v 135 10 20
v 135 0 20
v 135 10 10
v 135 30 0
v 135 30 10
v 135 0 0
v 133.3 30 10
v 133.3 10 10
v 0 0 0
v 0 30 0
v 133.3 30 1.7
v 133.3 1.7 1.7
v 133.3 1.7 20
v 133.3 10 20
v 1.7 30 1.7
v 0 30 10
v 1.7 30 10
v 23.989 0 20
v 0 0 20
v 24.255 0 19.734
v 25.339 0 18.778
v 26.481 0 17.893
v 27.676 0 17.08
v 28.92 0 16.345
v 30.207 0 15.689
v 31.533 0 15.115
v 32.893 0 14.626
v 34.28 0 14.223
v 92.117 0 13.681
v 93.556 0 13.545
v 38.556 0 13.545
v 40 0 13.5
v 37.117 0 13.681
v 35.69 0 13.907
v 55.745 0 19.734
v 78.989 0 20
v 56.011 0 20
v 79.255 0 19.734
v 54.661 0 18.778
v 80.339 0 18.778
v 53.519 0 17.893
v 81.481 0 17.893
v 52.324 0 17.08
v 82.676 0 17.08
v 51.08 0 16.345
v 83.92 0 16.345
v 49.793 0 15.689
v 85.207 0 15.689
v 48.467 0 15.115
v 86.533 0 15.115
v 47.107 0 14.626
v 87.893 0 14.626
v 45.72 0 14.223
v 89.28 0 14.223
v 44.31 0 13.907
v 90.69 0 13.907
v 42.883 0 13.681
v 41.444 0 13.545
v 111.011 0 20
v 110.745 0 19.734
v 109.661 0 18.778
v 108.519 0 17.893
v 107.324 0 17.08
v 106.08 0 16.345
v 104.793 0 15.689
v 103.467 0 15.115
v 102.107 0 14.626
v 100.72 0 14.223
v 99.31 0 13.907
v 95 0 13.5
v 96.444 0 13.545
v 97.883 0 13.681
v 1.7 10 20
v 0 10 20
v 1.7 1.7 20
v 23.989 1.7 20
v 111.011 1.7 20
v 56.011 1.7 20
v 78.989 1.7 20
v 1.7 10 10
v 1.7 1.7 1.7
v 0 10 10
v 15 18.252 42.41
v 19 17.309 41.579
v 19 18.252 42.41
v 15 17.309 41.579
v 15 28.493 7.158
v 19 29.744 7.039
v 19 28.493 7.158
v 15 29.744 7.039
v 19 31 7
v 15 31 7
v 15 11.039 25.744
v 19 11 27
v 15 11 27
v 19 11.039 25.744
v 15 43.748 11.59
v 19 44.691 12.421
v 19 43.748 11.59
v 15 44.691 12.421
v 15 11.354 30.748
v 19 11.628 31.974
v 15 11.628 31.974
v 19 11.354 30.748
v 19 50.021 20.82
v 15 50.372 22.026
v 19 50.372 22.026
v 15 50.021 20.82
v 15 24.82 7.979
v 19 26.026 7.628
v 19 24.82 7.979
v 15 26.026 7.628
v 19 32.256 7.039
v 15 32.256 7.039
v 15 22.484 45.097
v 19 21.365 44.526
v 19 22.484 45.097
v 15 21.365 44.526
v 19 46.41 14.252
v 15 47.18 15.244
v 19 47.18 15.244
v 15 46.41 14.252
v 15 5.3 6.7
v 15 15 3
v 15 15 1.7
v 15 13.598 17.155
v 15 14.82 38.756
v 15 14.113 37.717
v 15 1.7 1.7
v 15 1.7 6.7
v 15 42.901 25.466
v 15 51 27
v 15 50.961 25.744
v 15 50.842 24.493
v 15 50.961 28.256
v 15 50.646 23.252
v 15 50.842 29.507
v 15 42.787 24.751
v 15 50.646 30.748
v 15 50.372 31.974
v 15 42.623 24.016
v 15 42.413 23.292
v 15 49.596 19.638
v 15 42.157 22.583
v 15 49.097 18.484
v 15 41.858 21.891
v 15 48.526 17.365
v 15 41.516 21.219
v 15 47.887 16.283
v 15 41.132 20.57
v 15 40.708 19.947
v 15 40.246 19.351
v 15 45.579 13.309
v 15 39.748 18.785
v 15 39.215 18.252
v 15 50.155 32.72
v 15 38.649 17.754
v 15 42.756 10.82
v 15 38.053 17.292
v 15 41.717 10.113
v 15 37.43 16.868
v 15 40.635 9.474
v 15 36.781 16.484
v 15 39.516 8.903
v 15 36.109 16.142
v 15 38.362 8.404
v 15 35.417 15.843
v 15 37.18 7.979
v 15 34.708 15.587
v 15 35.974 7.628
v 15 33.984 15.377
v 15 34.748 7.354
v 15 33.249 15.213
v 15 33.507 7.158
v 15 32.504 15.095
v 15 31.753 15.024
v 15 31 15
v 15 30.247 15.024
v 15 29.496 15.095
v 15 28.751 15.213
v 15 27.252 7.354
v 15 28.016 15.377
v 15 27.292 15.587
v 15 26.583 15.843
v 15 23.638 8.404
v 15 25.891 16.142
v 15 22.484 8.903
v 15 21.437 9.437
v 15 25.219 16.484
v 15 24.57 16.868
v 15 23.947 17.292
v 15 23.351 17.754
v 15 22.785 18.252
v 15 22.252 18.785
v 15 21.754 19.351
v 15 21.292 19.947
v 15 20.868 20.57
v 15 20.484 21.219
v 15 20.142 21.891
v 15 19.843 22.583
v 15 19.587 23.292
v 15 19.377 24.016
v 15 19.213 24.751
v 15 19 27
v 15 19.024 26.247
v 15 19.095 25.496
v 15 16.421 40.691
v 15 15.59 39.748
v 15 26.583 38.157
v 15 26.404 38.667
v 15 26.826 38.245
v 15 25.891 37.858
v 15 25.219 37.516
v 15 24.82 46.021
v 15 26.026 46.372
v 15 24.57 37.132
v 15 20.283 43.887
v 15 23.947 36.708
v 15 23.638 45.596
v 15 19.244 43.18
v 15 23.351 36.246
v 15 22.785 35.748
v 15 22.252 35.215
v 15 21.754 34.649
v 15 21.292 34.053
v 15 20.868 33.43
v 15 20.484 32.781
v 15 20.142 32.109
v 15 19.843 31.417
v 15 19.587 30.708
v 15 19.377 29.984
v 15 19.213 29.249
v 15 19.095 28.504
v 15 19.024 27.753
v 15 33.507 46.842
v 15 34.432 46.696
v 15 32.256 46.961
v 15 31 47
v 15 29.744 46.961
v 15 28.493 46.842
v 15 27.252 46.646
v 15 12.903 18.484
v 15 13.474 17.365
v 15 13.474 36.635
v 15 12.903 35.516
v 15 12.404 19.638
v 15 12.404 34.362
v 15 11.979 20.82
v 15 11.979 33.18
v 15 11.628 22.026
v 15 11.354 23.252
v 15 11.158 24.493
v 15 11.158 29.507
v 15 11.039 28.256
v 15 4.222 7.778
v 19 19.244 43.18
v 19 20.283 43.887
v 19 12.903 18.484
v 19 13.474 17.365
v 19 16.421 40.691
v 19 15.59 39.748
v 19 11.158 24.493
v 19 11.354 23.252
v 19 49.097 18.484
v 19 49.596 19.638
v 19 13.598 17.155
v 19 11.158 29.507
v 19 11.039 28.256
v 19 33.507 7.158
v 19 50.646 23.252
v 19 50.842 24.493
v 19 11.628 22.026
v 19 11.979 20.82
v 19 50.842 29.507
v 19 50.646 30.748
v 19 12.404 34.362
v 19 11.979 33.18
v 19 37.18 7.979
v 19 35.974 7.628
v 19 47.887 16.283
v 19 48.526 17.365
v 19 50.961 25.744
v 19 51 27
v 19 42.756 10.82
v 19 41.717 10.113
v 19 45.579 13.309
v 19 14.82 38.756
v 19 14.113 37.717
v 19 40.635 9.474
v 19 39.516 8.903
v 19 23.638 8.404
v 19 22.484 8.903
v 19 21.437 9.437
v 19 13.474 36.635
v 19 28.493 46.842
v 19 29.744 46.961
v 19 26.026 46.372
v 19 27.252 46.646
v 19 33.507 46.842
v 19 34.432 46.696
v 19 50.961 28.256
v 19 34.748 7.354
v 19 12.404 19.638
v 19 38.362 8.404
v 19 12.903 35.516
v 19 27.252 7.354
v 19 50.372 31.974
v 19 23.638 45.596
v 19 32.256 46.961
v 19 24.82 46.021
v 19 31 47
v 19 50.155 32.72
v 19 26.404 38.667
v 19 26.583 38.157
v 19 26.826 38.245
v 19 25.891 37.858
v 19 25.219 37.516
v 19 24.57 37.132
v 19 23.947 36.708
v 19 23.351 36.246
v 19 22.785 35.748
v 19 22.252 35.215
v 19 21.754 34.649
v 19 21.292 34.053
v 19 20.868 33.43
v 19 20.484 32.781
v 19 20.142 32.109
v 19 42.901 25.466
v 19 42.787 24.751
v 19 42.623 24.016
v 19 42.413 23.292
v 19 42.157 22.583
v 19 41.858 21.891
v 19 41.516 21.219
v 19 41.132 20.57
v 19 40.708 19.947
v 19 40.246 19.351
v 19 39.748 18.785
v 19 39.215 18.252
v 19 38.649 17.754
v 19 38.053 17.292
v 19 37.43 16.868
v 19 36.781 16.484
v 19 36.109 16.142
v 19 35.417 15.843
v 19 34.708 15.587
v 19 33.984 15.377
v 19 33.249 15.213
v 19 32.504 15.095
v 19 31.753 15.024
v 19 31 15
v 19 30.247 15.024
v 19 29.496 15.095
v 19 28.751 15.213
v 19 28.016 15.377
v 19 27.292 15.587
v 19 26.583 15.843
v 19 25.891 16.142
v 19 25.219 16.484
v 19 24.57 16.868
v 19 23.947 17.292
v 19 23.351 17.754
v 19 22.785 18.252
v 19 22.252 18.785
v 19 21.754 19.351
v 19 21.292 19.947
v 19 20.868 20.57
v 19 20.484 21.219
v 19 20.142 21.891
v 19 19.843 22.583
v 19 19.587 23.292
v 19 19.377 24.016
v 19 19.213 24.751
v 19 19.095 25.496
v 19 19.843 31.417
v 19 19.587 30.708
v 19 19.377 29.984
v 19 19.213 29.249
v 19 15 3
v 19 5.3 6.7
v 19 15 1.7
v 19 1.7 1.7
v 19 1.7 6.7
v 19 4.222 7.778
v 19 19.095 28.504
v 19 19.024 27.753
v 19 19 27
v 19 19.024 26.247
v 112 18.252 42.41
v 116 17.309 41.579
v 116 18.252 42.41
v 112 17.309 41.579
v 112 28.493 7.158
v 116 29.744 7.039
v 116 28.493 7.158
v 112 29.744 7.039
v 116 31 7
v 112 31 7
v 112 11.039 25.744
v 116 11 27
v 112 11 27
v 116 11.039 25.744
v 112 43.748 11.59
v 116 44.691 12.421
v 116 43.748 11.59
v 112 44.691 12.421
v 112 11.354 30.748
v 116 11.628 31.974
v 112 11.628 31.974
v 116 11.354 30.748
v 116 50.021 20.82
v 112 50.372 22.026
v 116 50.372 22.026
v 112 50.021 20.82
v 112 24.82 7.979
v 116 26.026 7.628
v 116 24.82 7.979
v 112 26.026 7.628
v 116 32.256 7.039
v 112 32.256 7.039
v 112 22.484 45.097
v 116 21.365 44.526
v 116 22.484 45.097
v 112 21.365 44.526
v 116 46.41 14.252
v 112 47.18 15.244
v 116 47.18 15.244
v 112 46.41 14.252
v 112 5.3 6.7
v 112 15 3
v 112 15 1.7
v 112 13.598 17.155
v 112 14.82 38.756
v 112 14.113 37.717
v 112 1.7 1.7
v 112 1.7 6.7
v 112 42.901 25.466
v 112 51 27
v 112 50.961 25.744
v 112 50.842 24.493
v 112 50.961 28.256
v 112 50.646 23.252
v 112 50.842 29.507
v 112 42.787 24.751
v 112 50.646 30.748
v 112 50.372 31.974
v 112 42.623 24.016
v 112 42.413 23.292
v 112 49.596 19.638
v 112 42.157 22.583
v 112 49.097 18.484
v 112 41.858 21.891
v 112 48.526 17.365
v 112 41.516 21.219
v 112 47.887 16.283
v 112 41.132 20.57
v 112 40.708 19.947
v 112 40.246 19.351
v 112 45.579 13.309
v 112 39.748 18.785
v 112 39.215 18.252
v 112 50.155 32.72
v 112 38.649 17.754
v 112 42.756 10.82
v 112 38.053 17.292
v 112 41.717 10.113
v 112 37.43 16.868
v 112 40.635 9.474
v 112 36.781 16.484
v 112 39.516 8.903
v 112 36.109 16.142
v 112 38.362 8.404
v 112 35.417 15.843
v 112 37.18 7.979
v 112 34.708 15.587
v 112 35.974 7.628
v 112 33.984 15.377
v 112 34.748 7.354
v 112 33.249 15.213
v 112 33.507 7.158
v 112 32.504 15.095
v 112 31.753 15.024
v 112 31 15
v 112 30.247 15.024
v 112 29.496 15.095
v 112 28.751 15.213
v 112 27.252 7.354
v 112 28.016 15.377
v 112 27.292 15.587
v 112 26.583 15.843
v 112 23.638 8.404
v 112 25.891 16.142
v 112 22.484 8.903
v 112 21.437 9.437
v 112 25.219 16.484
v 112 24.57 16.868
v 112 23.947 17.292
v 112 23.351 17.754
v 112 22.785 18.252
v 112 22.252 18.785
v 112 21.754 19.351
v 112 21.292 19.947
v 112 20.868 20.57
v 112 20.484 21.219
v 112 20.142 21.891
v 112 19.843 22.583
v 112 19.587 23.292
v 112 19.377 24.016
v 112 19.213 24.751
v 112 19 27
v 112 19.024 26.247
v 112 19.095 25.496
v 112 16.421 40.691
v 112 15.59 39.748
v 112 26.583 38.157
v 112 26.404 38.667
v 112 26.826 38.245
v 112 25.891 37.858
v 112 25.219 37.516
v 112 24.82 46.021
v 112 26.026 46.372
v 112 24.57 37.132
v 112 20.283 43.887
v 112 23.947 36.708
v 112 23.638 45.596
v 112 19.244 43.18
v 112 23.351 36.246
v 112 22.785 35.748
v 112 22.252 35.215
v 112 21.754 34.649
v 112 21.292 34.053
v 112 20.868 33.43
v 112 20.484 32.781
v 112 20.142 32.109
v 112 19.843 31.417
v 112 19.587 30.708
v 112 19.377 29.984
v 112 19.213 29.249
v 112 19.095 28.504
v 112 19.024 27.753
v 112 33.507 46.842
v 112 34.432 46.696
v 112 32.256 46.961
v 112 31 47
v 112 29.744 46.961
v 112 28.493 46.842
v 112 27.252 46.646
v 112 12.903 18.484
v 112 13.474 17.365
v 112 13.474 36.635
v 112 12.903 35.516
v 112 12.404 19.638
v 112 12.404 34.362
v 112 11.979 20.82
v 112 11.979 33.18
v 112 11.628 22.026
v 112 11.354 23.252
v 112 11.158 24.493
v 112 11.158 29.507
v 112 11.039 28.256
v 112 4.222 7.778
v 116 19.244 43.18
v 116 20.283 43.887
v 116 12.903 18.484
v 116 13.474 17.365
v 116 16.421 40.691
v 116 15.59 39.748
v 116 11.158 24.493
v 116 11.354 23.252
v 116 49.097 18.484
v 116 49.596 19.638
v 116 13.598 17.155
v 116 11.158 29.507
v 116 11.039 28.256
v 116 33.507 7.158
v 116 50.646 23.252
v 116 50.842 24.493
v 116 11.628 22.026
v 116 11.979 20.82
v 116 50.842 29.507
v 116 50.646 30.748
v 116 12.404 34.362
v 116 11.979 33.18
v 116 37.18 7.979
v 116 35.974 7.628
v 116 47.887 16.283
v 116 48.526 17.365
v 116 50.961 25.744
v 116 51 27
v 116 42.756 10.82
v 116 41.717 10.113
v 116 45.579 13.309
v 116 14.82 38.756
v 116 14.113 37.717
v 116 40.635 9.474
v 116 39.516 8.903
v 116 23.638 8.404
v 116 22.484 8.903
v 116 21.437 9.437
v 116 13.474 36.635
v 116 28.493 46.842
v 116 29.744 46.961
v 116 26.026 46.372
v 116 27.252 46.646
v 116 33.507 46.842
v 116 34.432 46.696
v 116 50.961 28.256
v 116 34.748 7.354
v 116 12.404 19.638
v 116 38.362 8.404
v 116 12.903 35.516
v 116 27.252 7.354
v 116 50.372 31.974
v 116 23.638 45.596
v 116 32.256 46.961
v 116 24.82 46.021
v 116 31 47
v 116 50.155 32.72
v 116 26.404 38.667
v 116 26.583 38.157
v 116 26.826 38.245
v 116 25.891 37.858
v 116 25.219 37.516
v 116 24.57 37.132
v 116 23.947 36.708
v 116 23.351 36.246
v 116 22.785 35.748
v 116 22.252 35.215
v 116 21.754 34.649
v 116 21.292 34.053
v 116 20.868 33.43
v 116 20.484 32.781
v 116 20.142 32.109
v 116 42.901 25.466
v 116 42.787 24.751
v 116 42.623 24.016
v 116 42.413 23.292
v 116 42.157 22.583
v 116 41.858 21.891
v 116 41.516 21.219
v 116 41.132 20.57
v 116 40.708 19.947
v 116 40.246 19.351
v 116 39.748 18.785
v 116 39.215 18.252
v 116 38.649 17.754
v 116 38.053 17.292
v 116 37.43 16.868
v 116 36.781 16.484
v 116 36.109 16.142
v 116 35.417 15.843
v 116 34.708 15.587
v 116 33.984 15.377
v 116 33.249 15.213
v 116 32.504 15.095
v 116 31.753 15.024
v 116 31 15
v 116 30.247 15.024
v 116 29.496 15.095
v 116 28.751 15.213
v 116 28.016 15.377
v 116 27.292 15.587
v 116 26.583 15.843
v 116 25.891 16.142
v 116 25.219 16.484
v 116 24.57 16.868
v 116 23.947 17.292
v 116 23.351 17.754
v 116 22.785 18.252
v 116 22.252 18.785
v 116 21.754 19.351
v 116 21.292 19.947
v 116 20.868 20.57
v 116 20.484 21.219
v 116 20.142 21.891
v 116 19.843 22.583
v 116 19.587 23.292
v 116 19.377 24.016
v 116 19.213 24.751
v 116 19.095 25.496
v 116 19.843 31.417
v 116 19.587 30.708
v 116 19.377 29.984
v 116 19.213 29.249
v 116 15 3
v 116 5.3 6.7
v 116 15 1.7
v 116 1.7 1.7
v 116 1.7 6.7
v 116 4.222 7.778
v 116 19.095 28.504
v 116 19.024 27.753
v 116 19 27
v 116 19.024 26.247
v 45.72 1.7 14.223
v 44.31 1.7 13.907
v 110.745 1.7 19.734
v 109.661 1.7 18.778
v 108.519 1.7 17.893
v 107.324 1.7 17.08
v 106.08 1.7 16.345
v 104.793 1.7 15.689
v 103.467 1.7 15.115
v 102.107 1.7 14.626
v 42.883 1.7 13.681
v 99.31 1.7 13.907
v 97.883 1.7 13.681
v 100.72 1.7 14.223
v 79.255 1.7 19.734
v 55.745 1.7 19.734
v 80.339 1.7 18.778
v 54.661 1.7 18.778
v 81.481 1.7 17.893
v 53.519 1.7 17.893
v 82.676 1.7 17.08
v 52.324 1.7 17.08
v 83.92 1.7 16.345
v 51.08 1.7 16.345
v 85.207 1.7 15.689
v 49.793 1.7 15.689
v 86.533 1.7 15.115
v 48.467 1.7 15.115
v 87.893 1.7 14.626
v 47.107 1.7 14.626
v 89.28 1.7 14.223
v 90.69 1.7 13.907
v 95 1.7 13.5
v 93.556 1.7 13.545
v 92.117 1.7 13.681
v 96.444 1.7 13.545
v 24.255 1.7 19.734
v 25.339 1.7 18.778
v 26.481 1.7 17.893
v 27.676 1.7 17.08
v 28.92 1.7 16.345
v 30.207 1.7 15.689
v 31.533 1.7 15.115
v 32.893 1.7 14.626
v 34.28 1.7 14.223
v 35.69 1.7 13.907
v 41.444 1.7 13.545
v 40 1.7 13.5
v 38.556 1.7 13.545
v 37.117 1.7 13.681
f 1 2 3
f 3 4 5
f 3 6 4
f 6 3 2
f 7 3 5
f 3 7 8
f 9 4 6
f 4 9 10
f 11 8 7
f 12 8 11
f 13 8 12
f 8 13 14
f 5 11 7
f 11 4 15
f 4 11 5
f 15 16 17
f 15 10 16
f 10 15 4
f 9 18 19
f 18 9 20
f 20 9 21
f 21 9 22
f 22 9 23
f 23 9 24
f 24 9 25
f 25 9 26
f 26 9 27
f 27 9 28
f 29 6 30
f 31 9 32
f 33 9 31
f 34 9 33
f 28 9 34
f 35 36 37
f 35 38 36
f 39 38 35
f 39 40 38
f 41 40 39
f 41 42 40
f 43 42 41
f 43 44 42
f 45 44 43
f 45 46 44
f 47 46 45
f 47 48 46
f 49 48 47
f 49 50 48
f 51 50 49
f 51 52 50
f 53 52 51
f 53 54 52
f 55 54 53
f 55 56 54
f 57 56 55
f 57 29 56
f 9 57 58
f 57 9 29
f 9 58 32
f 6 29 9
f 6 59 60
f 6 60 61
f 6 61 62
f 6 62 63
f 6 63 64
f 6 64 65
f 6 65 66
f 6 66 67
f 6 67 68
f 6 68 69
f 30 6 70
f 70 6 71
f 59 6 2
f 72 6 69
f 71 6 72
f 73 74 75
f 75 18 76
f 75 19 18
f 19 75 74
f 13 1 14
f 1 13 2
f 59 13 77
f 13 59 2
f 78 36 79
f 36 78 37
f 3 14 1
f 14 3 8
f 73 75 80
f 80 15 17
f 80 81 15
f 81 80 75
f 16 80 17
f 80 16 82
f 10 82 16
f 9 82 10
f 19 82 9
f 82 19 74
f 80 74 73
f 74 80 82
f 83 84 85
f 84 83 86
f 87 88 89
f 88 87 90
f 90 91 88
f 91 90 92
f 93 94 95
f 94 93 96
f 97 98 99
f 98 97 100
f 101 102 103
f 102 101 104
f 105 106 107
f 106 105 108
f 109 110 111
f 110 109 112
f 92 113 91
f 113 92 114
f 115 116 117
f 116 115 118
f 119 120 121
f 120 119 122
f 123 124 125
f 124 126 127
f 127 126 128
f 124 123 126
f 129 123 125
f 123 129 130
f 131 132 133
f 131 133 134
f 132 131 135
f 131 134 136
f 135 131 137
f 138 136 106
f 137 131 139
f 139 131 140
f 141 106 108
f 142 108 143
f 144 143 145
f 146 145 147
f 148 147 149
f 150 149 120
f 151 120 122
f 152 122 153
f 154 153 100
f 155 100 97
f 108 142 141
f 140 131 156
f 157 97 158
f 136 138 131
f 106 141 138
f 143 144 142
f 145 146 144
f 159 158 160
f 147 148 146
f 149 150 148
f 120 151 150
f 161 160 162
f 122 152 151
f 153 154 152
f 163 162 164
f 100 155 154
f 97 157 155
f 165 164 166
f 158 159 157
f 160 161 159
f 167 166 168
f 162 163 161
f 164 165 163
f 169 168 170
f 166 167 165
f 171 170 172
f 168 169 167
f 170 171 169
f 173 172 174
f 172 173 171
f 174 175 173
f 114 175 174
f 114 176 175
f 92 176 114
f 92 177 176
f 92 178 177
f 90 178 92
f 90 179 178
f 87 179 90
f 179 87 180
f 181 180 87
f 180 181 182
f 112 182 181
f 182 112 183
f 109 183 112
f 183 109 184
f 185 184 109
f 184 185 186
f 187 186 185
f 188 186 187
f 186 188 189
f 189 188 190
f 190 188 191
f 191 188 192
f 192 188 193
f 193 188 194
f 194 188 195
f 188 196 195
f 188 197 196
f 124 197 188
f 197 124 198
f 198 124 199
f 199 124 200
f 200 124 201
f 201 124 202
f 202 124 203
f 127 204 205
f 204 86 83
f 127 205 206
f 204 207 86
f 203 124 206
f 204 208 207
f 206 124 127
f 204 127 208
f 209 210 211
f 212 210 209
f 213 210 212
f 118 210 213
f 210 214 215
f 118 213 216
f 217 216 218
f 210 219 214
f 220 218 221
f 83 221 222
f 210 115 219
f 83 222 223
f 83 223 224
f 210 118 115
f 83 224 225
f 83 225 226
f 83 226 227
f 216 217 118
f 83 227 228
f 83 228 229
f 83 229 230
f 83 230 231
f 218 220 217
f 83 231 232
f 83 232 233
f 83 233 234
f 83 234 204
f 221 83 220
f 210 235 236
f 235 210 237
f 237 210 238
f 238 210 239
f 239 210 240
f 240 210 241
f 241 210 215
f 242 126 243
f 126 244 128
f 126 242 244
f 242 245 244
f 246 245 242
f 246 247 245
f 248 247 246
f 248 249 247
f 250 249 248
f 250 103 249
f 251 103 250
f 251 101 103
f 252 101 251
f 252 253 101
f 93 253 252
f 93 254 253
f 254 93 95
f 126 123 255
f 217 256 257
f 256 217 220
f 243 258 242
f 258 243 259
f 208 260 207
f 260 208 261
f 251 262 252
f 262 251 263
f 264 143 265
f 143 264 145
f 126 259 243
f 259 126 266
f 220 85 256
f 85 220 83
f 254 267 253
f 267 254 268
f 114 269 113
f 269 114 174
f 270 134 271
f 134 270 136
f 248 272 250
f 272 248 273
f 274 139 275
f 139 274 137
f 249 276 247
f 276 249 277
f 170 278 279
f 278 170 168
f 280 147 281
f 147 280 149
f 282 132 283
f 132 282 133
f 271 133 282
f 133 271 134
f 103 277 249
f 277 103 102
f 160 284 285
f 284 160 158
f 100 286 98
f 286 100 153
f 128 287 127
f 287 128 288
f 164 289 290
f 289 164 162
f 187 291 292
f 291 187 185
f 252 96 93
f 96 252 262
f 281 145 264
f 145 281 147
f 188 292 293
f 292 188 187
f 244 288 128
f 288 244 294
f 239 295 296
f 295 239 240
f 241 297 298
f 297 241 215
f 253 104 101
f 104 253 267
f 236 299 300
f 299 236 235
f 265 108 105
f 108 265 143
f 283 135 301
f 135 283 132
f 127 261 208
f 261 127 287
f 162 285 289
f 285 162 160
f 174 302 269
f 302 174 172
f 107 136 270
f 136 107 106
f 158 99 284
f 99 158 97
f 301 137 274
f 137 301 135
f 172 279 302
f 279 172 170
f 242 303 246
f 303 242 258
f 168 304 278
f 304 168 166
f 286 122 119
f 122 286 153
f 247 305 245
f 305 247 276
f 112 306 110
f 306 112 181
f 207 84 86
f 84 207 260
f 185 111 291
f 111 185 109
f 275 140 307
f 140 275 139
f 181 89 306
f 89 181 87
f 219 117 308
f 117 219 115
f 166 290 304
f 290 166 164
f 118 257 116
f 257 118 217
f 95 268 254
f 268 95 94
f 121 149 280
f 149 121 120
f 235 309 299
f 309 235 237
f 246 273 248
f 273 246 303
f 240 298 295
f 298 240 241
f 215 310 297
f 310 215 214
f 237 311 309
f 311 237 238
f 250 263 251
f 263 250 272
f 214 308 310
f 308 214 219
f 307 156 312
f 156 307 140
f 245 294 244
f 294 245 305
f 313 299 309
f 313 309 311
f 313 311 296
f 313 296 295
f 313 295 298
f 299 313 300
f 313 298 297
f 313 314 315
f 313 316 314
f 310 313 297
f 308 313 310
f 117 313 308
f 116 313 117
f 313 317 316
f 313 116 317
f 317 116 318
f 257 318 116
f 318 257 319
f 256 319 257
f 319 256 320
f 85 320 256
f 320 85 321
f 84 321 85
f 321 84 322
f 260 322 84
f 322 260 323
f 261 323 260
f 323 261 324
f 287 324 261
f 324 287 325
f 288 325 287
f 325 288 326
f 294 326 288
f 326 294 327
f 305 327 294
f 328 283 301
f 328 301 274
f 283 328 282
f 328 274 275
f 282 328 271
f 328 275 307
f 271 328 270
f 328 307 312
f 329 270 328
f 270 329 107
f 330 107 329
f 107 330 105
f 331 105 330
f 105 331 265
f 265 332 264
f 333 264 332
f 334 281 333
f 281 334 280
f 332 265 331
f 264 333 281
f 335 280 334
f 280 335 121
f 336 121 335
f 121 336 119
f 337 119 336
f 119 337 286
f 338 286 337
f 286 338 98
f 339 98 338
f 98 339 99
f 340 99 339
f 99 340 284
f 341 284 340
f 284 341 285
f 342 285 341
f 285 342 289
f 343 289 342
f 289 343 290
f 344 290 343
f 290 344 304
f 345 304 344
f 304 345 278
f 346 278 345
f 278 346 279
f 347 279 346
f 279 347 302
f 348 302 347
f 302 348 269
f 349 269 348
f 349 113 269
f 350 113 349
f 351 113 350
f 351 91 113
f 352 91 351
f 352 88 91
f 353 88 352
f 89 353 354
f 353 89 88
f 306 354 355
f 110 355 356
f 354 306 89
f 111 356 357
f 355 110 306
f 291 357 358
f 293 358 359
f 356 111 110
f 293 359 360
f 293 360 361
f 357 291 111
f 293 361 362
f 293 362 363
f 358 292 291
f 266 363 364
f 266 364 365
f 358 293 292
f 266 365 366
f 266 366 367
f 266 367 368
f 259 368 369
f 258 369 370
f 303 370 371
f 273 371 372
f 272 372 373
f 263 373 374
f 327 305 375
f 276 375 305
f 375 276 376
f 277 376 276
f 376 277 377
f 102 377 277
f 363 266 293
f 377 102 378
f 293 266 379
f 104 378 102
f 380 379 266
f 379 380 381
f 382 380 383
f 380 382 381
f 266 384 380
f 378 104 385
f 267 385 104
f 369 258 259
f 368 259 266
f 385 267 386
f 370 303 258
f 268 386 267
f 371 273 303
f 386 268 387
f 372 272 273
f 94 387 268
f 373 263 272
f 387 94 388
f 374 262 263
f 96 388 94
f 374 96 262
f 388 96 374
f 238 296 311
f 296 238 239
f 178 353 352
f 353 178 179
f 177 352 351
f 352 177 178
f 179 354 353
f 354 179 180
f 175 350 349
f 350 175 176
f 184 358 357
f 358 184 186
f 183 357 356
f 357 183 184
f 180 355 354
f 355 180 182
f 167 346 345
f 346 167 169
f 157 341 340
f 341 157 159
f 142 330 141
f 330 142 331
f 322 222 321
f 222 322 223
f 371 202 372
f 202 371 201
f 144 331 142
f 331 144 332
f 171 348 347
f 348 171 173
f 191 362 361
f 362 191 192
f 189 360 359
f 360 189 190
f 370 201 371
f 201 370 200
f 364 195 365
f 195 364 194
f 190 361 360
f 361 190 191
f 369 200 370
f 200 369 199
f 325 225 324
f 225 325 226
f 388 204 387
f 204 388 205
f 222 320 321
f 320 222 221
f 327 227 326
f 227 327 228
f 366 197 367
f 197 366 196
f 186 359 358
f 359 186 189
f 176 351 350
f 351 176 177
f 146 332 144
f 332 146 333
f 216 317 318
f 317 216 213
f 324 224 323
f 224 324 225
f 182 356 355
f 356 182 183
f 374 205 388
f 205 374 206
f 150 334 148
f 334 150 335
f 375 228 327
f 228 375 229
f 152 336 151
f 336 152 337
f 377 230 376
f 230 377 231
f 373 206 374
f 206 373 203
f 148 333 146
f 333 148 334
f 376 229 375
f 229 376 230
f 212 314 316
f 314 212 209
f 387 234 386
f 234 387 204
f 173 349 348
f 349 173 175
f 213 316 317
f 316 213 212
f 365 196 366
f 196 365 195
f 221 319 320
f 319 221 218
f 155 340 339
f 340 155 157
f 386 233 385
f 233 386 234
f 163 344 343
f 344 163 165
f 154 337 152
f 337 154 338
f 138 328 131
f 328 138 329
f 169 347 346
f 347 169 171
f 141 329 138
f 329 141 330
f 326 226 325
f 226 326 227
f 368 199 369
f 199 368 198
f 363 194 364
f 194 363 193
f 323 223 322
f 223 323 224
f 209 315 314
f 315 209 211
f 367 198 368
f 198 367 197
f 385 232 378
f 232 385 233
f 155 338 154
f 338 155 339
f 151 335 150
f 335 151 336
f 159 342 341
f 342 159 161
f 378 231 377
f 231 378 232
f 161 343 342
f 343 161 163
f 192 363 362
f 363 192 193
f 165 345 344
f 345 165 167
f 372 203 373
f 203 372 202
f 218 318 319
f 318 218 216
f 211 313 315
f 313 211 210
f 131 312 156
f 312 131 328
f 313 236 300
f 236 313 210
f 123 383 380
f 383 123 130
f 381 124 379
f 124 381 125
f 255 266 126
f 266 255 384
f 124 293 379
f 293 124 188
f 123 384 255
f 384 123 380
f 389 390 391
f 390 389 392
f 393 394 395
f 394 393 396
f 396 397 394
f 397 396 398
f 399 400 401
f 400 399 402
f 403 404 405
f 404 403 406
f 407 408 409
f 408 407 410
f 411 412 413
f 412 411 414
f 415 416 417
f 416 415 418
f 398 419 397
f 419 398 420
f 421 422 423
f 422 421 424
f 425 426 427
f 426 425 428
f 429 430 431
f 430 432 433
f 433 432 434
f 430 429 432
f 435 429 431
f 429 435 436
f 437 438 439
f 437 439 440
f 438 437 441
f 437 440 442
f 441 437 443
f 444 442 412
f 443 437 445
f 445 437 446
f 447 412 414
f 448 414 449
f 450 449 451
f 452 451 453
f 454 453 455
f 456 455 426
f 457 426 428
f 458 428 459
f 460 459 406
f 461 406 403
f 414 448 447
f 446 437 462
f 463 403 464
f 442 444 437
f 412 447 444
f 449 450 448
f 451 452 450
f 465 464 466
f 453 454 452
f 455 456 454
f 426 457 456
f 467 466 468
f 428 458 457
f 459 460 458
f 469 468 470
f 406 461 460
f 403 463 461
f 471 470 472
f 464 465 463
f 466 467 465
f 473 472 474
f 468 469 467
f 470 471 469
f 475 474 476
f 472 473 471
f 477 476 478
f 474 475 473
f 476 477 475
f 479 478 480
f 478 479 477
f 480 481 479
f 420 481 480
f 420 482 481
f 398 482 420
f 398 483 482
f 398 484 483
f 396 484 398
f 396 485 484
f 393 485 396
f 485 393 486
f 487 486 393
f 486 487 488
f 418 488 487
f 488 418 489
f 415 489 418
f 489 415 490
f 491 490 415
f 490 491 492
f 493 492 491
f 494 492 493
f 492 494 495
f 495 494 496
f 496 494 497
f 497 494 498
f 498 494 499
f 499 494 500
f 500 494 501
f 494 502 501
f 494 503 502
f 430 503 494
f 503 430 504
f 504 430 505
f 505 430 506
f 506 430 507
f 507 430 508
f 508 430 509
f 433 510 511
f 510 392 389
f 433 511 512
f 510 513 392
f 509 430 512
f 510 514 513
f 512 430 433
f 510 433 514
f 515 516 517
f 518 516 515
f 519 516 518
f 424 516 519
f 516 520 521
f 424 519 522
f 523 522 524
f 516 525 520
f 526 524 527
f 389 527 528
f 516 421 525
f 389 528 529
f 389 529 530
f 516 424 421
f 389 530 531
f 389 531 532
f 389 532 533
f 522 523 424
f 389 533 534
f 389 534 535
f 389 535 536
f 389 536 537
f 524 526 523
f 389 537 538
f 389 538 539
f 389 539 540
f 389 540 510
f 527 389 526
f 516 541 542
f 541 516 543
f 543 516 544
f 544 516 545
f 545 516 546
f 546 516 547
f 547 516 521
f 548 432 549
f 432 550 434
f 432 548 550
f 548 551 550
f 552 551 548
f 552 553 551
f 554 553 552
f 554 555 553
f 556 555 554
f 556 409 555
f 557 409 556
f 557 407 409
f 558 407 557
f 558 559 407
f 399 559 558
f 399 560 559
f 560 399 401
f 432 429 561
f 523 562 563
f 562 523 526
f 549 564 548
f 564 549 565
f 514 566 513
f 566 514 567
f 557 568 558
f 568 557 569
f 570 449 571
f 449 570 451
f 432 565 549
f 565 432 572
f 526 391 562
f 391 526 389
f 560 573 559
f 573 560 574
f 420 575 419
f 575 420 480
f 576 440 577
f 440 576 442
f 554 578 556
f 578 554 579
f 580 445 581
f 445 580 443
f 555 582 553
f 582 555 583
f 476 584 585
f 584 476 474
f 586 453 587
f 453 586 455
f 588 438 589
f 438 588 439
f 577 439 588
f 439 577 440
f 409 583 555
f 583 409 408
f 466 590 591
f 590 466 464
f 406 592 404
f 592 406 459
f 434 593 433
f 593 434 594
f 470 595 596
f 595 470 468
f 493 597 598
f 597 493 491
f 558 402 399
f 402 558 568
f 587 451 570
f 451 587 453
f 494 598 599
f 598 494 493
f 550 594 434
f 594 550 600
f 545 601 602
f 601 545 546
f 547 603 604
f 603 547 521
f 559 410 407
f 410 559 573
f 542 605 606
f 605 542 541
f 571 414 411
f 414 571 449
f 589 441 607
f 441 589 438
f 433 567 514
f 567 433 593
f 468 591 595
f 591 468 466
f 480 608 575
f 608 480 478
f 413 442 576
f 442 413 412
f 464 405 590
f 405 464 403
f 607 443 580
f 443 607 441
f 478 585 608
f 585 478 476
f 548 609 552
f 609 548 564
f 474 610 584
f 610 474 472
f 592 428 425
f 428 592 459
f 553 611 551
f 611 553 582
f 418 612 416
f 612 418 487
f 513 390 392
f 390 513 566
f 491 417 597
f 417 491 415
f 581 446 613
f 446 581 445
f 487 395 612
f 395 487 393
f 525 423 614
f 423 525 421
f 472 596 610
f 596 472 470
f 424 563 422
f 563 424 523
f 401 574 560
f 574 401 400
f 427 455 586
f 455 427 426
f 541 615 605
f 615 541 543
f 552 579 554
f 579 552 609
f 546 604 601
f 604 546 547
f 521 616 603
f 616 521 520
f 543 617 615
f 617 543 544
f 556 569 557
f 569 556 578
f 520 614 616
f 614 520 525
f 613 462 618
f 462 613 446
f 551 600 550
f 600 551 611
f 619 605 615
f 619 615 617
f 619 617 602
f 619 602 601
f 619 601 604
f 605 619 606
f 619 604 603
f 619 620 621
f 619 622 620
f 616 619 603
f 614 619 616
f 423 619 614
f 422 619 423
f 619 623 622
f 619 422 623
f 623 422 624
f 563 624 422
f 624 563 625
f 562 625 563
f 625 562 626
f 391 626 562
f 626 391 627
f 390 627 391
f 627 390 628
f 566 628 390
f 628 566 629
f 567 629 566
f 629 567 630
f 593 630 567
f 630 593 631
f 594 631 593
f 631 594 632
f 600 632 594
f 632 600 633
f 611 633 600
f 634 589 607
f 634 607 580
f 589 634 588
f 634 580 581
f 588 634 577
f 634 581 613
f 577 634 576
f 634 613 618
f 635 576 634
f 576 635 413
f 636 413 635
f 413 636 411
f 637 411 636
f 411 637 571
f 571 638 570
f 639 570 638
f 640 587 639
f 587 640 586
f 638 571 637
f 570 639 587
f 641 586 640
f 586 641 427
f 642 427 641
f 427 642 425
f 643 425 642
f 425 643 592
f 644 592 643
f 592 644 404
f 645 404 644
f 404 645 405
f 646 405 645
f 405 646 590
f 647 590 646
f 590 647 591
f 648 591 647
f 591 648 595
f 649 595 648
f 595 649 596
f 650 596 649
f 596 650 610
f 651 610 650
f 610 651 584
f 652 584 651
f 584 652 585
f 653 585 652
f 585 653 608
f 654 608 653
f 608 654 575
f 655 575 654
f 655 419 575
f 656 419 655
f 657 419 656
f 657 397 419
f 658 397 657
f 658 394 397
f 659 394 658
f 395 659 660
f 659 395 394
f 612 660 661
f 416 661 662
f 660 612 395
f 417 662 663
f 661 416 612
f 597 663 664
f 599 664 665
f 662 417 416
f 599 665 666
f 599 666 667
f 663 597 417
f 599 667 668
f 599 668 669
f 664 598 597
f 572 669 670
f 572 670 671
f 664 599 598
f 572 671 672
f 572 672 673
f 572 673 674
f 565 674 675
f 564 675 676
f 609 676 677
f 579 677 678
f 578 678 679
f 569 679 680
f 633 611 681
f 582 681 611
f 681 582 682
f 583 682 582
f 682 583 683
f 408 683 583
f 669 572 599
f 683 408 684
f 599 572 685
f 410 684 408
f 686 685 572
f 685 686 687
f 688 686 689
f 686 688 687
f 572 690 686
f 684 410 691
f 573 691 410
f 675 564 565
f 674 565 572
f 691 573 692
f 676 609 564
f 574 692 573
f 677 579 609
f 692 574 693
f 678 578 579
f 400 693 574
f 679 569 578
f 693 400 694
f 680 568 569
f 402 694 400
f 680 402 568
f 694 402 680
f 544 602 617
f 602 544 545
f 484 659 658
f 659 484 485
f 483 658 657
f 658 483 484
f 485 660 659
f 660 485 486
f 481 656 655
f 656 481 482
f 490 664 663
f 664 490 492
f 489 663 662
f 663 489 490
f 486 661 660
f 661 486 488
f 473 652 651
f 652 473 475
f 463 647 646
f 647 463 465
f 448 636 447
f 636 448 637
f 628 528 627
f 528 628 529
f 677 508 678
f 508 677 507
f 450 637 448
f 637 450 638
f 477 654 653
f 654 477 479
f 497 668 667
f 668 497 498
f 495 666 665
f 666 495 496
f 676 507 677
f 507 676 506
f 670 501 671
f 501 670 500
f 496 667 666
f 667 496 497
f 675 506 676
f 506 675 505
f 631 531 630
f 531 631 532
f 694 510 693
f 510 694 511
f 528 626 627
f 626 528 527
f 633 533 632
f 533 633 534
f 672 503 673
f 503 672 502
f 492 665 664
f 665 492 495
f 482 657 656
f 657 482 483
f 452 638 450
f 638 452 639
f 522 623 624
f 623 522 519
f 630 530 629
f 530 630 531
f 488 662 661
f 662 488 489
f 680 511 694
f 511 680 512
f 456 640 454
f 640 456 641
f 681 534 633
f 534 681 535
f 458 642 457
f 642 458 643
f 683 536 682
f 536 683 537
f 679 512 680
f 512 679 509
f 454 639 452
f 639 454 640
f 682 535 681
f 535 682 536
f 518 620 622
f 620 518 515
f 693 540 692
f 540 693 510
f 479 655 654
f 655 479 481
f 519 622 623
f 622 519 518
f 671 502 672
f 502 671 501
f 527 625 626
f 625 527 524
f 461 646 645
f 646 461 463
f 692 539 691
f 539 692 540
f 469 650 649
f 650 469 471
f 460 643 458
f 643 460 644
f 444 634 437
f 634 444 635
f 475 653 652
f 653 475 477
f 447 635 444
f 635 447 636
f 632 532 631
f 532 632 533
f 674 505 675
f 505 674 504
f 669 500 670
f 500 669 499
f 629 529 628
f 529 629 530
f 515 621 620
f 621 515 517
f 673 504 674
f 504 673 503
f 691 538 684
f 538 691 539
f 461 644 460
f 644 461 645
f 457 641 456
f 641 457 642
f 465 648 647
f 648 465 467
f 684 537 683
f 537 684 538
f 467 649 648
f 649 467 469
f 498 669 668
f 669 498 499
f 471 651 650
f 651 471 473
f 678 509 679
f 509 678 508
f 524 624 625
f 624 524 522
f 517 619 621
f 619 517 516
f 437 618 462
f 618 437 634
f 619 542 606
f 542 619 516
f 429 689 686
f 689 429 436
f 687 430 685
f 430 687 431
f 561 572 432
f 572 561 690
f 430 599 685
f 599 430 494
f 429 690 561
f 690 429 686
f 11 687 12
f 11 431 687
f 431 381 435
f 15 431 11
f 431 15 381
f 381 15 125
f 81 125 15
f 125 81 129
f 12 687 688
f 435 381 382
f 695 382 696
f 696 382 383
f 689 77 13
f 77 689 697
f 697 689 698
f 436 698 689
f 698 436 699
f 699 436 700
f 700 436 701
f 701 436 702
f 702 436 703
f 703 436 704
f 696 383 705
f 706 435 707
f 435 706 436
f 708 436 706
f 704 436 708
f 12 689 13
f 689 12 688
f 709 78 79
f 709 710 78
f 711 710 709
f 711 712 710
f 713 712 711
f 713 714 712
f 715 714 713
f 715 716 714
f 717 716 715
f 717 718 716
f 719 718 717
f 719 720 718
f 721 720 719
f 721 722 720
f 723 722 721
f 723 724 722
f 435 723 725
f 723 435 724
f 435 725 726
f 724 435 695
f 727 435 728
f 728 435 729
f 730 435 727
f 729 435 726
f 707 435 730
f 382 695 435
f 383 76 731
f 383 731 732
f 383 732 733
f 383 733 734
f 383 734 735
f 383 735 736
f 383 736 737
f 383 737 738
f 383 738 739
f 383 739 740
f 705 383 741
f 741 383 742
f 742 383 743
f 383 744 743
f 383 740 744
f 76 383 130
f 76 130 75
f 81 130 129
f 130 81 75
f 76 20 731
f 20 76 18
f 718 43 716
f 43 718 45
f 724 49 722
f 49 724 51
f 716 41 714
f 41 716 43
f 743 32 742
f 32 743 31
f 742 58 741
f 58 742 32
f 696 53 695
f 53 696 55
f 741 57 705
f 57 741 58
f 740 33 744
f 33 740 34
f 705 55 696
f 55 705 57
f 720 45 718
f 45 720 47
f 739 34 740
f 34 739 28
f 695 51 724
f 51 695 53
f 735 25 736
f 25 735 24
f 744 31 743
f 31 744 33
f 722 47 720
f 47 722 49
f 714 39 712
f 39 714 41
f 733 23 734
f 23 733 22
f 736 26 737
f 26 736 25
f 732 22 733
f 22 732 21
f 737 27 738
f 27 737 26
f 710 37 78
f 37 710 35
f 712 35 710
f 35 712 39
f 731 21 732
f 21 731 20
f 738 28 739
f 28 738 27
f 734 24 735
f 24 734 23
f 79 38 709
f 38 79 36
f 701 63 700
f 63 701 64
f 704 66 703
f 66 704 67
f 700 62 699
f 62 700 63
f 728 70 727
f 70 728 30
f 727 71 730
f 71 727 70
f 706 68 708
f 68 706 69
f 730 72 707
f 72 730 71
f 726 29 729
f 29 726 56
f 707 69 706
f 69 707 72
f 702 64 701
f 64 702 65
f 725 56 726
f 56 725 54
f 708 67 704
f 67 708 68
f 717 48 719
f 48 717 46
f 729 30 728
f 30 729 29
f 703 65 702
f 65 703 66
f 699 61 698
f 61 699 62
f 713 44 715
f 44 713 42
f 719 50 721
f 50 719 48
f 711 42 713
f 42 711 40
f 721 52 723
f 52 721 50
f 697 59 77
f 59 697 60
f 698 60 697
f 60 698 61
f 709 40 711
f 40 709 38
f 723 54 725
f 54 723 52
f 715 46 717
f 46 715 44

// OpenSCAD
// Parameter
dicke = 1.7;           // Materialstärke
laenge = 135;          // Länge des Winkels
schenkel1 = 30;        // Breite Schenkel 1
schenkel2 = 20;        // Breite Schenkel 2
einbuchtung_breite = 33;
einbuchtung_tiefe = 6.5;
abstand_vom_rand = 40;  //Einbuchtung
radius = 23;            //Einbuchtung
begrenzungshoehe = 10; // Begrenzung rechts und links

// Schlüssel-Parameter
maul_aussen = 40;
maul_innen = 24;
maul_dicke = 4;
maul_winkel = 45;  // Neigung des Schlüssels
maul_abstand = 15;

module maulschluessel() {
    difference() {
        // Außenkreis
        cylinder(h = maul_dicke, r = maul_aussen / 2, $fn = 100);

        // Innenausschnitt (Maulöffnung)
        translate([0, 0, -1])
          cylinder(h = maul_dicke + 2, r = maul_innen / 2, $fn = 100);

        // Schlitz in Richtung Öffnung
        rotate([0, 0, -135])
        translate([5, -maul_innen/2+0.5, -1])
            cube([maul_innen, maul_innen-3, maul_dicke + 2]);
    }



}

module maulhalter(pos_x) {
        translate([pos_x-maul_dicke, 0, 1])
    color([0,1,0]) 
            cube([maul_dicke, 15, 5+dicke-1]);
      
        translate([pos_x-maul_dicke, 12, 0])
          rotate([45, 0, 0])
            color([1,0,0]) 
            cube([maul_dicke, 15, 11]);
}

module seitliche_begrenzung(pos_x) {
    // Eine 10mm hohe Wand an einer Stirnseite des Winkels
    translate([pos_x, 0, 0])
        cube([dicke, schenkel1, begrenzungshoehe]); // auf Schenkel 1
    translate([pos_x, 0, 0])
        cube([dicke, begrenzungshoehe,schenkel2]); // auf Schenkel 1
}


difference() {
    union() {
        // Schenkel 1 (unten)
        cube([laenge, schenkel1, dicke]);

        // Schenkel 2 (oben)
        translate([0, 0, 0])
            cube([laenge, dicke, schenkel2]);
        
        // Rechte Begrenzung (am Ende)
        seitliche_begrenzung(laenge - dicke);

        // Linke Begrenzung (am Anfang)
        seitliche_begrenzung(0);

        // Maulschlüssel links vorne
        translate([maul_abstand+maul_dicke, maul_aussen/2+11, maul_aussen/2+7])
         rotate([180, 90, 0]) {
            maulschluessel();
         }
         //halter
        maulhalter(maul_abstand+maul_dicke);

        // Zweiter Schlüssel rechts hinten 
      translate([laenge-maul_abstand-maul_dicke,maul_aussen/2+11,maul_aussen/2+7])
        rotate([180, 90, 0])
            maulschluessel();   
         //halter
        maulhalter(laenge-maul_abstand-maul_dicke);
           
      }

    // Einbuchtungen auf Schenkel 2
    for (pos = [abstand_vom_rand, laenge - abstand_vom_rand]) {
        translate([pos, dicke+0.5, schenkel2+radius-einbuchtung_tiefe])
            rotate([90, 0, 0])
                cylinder(h = dicke + 1.2, r = radius, $fn = 100);
    }

}
    
